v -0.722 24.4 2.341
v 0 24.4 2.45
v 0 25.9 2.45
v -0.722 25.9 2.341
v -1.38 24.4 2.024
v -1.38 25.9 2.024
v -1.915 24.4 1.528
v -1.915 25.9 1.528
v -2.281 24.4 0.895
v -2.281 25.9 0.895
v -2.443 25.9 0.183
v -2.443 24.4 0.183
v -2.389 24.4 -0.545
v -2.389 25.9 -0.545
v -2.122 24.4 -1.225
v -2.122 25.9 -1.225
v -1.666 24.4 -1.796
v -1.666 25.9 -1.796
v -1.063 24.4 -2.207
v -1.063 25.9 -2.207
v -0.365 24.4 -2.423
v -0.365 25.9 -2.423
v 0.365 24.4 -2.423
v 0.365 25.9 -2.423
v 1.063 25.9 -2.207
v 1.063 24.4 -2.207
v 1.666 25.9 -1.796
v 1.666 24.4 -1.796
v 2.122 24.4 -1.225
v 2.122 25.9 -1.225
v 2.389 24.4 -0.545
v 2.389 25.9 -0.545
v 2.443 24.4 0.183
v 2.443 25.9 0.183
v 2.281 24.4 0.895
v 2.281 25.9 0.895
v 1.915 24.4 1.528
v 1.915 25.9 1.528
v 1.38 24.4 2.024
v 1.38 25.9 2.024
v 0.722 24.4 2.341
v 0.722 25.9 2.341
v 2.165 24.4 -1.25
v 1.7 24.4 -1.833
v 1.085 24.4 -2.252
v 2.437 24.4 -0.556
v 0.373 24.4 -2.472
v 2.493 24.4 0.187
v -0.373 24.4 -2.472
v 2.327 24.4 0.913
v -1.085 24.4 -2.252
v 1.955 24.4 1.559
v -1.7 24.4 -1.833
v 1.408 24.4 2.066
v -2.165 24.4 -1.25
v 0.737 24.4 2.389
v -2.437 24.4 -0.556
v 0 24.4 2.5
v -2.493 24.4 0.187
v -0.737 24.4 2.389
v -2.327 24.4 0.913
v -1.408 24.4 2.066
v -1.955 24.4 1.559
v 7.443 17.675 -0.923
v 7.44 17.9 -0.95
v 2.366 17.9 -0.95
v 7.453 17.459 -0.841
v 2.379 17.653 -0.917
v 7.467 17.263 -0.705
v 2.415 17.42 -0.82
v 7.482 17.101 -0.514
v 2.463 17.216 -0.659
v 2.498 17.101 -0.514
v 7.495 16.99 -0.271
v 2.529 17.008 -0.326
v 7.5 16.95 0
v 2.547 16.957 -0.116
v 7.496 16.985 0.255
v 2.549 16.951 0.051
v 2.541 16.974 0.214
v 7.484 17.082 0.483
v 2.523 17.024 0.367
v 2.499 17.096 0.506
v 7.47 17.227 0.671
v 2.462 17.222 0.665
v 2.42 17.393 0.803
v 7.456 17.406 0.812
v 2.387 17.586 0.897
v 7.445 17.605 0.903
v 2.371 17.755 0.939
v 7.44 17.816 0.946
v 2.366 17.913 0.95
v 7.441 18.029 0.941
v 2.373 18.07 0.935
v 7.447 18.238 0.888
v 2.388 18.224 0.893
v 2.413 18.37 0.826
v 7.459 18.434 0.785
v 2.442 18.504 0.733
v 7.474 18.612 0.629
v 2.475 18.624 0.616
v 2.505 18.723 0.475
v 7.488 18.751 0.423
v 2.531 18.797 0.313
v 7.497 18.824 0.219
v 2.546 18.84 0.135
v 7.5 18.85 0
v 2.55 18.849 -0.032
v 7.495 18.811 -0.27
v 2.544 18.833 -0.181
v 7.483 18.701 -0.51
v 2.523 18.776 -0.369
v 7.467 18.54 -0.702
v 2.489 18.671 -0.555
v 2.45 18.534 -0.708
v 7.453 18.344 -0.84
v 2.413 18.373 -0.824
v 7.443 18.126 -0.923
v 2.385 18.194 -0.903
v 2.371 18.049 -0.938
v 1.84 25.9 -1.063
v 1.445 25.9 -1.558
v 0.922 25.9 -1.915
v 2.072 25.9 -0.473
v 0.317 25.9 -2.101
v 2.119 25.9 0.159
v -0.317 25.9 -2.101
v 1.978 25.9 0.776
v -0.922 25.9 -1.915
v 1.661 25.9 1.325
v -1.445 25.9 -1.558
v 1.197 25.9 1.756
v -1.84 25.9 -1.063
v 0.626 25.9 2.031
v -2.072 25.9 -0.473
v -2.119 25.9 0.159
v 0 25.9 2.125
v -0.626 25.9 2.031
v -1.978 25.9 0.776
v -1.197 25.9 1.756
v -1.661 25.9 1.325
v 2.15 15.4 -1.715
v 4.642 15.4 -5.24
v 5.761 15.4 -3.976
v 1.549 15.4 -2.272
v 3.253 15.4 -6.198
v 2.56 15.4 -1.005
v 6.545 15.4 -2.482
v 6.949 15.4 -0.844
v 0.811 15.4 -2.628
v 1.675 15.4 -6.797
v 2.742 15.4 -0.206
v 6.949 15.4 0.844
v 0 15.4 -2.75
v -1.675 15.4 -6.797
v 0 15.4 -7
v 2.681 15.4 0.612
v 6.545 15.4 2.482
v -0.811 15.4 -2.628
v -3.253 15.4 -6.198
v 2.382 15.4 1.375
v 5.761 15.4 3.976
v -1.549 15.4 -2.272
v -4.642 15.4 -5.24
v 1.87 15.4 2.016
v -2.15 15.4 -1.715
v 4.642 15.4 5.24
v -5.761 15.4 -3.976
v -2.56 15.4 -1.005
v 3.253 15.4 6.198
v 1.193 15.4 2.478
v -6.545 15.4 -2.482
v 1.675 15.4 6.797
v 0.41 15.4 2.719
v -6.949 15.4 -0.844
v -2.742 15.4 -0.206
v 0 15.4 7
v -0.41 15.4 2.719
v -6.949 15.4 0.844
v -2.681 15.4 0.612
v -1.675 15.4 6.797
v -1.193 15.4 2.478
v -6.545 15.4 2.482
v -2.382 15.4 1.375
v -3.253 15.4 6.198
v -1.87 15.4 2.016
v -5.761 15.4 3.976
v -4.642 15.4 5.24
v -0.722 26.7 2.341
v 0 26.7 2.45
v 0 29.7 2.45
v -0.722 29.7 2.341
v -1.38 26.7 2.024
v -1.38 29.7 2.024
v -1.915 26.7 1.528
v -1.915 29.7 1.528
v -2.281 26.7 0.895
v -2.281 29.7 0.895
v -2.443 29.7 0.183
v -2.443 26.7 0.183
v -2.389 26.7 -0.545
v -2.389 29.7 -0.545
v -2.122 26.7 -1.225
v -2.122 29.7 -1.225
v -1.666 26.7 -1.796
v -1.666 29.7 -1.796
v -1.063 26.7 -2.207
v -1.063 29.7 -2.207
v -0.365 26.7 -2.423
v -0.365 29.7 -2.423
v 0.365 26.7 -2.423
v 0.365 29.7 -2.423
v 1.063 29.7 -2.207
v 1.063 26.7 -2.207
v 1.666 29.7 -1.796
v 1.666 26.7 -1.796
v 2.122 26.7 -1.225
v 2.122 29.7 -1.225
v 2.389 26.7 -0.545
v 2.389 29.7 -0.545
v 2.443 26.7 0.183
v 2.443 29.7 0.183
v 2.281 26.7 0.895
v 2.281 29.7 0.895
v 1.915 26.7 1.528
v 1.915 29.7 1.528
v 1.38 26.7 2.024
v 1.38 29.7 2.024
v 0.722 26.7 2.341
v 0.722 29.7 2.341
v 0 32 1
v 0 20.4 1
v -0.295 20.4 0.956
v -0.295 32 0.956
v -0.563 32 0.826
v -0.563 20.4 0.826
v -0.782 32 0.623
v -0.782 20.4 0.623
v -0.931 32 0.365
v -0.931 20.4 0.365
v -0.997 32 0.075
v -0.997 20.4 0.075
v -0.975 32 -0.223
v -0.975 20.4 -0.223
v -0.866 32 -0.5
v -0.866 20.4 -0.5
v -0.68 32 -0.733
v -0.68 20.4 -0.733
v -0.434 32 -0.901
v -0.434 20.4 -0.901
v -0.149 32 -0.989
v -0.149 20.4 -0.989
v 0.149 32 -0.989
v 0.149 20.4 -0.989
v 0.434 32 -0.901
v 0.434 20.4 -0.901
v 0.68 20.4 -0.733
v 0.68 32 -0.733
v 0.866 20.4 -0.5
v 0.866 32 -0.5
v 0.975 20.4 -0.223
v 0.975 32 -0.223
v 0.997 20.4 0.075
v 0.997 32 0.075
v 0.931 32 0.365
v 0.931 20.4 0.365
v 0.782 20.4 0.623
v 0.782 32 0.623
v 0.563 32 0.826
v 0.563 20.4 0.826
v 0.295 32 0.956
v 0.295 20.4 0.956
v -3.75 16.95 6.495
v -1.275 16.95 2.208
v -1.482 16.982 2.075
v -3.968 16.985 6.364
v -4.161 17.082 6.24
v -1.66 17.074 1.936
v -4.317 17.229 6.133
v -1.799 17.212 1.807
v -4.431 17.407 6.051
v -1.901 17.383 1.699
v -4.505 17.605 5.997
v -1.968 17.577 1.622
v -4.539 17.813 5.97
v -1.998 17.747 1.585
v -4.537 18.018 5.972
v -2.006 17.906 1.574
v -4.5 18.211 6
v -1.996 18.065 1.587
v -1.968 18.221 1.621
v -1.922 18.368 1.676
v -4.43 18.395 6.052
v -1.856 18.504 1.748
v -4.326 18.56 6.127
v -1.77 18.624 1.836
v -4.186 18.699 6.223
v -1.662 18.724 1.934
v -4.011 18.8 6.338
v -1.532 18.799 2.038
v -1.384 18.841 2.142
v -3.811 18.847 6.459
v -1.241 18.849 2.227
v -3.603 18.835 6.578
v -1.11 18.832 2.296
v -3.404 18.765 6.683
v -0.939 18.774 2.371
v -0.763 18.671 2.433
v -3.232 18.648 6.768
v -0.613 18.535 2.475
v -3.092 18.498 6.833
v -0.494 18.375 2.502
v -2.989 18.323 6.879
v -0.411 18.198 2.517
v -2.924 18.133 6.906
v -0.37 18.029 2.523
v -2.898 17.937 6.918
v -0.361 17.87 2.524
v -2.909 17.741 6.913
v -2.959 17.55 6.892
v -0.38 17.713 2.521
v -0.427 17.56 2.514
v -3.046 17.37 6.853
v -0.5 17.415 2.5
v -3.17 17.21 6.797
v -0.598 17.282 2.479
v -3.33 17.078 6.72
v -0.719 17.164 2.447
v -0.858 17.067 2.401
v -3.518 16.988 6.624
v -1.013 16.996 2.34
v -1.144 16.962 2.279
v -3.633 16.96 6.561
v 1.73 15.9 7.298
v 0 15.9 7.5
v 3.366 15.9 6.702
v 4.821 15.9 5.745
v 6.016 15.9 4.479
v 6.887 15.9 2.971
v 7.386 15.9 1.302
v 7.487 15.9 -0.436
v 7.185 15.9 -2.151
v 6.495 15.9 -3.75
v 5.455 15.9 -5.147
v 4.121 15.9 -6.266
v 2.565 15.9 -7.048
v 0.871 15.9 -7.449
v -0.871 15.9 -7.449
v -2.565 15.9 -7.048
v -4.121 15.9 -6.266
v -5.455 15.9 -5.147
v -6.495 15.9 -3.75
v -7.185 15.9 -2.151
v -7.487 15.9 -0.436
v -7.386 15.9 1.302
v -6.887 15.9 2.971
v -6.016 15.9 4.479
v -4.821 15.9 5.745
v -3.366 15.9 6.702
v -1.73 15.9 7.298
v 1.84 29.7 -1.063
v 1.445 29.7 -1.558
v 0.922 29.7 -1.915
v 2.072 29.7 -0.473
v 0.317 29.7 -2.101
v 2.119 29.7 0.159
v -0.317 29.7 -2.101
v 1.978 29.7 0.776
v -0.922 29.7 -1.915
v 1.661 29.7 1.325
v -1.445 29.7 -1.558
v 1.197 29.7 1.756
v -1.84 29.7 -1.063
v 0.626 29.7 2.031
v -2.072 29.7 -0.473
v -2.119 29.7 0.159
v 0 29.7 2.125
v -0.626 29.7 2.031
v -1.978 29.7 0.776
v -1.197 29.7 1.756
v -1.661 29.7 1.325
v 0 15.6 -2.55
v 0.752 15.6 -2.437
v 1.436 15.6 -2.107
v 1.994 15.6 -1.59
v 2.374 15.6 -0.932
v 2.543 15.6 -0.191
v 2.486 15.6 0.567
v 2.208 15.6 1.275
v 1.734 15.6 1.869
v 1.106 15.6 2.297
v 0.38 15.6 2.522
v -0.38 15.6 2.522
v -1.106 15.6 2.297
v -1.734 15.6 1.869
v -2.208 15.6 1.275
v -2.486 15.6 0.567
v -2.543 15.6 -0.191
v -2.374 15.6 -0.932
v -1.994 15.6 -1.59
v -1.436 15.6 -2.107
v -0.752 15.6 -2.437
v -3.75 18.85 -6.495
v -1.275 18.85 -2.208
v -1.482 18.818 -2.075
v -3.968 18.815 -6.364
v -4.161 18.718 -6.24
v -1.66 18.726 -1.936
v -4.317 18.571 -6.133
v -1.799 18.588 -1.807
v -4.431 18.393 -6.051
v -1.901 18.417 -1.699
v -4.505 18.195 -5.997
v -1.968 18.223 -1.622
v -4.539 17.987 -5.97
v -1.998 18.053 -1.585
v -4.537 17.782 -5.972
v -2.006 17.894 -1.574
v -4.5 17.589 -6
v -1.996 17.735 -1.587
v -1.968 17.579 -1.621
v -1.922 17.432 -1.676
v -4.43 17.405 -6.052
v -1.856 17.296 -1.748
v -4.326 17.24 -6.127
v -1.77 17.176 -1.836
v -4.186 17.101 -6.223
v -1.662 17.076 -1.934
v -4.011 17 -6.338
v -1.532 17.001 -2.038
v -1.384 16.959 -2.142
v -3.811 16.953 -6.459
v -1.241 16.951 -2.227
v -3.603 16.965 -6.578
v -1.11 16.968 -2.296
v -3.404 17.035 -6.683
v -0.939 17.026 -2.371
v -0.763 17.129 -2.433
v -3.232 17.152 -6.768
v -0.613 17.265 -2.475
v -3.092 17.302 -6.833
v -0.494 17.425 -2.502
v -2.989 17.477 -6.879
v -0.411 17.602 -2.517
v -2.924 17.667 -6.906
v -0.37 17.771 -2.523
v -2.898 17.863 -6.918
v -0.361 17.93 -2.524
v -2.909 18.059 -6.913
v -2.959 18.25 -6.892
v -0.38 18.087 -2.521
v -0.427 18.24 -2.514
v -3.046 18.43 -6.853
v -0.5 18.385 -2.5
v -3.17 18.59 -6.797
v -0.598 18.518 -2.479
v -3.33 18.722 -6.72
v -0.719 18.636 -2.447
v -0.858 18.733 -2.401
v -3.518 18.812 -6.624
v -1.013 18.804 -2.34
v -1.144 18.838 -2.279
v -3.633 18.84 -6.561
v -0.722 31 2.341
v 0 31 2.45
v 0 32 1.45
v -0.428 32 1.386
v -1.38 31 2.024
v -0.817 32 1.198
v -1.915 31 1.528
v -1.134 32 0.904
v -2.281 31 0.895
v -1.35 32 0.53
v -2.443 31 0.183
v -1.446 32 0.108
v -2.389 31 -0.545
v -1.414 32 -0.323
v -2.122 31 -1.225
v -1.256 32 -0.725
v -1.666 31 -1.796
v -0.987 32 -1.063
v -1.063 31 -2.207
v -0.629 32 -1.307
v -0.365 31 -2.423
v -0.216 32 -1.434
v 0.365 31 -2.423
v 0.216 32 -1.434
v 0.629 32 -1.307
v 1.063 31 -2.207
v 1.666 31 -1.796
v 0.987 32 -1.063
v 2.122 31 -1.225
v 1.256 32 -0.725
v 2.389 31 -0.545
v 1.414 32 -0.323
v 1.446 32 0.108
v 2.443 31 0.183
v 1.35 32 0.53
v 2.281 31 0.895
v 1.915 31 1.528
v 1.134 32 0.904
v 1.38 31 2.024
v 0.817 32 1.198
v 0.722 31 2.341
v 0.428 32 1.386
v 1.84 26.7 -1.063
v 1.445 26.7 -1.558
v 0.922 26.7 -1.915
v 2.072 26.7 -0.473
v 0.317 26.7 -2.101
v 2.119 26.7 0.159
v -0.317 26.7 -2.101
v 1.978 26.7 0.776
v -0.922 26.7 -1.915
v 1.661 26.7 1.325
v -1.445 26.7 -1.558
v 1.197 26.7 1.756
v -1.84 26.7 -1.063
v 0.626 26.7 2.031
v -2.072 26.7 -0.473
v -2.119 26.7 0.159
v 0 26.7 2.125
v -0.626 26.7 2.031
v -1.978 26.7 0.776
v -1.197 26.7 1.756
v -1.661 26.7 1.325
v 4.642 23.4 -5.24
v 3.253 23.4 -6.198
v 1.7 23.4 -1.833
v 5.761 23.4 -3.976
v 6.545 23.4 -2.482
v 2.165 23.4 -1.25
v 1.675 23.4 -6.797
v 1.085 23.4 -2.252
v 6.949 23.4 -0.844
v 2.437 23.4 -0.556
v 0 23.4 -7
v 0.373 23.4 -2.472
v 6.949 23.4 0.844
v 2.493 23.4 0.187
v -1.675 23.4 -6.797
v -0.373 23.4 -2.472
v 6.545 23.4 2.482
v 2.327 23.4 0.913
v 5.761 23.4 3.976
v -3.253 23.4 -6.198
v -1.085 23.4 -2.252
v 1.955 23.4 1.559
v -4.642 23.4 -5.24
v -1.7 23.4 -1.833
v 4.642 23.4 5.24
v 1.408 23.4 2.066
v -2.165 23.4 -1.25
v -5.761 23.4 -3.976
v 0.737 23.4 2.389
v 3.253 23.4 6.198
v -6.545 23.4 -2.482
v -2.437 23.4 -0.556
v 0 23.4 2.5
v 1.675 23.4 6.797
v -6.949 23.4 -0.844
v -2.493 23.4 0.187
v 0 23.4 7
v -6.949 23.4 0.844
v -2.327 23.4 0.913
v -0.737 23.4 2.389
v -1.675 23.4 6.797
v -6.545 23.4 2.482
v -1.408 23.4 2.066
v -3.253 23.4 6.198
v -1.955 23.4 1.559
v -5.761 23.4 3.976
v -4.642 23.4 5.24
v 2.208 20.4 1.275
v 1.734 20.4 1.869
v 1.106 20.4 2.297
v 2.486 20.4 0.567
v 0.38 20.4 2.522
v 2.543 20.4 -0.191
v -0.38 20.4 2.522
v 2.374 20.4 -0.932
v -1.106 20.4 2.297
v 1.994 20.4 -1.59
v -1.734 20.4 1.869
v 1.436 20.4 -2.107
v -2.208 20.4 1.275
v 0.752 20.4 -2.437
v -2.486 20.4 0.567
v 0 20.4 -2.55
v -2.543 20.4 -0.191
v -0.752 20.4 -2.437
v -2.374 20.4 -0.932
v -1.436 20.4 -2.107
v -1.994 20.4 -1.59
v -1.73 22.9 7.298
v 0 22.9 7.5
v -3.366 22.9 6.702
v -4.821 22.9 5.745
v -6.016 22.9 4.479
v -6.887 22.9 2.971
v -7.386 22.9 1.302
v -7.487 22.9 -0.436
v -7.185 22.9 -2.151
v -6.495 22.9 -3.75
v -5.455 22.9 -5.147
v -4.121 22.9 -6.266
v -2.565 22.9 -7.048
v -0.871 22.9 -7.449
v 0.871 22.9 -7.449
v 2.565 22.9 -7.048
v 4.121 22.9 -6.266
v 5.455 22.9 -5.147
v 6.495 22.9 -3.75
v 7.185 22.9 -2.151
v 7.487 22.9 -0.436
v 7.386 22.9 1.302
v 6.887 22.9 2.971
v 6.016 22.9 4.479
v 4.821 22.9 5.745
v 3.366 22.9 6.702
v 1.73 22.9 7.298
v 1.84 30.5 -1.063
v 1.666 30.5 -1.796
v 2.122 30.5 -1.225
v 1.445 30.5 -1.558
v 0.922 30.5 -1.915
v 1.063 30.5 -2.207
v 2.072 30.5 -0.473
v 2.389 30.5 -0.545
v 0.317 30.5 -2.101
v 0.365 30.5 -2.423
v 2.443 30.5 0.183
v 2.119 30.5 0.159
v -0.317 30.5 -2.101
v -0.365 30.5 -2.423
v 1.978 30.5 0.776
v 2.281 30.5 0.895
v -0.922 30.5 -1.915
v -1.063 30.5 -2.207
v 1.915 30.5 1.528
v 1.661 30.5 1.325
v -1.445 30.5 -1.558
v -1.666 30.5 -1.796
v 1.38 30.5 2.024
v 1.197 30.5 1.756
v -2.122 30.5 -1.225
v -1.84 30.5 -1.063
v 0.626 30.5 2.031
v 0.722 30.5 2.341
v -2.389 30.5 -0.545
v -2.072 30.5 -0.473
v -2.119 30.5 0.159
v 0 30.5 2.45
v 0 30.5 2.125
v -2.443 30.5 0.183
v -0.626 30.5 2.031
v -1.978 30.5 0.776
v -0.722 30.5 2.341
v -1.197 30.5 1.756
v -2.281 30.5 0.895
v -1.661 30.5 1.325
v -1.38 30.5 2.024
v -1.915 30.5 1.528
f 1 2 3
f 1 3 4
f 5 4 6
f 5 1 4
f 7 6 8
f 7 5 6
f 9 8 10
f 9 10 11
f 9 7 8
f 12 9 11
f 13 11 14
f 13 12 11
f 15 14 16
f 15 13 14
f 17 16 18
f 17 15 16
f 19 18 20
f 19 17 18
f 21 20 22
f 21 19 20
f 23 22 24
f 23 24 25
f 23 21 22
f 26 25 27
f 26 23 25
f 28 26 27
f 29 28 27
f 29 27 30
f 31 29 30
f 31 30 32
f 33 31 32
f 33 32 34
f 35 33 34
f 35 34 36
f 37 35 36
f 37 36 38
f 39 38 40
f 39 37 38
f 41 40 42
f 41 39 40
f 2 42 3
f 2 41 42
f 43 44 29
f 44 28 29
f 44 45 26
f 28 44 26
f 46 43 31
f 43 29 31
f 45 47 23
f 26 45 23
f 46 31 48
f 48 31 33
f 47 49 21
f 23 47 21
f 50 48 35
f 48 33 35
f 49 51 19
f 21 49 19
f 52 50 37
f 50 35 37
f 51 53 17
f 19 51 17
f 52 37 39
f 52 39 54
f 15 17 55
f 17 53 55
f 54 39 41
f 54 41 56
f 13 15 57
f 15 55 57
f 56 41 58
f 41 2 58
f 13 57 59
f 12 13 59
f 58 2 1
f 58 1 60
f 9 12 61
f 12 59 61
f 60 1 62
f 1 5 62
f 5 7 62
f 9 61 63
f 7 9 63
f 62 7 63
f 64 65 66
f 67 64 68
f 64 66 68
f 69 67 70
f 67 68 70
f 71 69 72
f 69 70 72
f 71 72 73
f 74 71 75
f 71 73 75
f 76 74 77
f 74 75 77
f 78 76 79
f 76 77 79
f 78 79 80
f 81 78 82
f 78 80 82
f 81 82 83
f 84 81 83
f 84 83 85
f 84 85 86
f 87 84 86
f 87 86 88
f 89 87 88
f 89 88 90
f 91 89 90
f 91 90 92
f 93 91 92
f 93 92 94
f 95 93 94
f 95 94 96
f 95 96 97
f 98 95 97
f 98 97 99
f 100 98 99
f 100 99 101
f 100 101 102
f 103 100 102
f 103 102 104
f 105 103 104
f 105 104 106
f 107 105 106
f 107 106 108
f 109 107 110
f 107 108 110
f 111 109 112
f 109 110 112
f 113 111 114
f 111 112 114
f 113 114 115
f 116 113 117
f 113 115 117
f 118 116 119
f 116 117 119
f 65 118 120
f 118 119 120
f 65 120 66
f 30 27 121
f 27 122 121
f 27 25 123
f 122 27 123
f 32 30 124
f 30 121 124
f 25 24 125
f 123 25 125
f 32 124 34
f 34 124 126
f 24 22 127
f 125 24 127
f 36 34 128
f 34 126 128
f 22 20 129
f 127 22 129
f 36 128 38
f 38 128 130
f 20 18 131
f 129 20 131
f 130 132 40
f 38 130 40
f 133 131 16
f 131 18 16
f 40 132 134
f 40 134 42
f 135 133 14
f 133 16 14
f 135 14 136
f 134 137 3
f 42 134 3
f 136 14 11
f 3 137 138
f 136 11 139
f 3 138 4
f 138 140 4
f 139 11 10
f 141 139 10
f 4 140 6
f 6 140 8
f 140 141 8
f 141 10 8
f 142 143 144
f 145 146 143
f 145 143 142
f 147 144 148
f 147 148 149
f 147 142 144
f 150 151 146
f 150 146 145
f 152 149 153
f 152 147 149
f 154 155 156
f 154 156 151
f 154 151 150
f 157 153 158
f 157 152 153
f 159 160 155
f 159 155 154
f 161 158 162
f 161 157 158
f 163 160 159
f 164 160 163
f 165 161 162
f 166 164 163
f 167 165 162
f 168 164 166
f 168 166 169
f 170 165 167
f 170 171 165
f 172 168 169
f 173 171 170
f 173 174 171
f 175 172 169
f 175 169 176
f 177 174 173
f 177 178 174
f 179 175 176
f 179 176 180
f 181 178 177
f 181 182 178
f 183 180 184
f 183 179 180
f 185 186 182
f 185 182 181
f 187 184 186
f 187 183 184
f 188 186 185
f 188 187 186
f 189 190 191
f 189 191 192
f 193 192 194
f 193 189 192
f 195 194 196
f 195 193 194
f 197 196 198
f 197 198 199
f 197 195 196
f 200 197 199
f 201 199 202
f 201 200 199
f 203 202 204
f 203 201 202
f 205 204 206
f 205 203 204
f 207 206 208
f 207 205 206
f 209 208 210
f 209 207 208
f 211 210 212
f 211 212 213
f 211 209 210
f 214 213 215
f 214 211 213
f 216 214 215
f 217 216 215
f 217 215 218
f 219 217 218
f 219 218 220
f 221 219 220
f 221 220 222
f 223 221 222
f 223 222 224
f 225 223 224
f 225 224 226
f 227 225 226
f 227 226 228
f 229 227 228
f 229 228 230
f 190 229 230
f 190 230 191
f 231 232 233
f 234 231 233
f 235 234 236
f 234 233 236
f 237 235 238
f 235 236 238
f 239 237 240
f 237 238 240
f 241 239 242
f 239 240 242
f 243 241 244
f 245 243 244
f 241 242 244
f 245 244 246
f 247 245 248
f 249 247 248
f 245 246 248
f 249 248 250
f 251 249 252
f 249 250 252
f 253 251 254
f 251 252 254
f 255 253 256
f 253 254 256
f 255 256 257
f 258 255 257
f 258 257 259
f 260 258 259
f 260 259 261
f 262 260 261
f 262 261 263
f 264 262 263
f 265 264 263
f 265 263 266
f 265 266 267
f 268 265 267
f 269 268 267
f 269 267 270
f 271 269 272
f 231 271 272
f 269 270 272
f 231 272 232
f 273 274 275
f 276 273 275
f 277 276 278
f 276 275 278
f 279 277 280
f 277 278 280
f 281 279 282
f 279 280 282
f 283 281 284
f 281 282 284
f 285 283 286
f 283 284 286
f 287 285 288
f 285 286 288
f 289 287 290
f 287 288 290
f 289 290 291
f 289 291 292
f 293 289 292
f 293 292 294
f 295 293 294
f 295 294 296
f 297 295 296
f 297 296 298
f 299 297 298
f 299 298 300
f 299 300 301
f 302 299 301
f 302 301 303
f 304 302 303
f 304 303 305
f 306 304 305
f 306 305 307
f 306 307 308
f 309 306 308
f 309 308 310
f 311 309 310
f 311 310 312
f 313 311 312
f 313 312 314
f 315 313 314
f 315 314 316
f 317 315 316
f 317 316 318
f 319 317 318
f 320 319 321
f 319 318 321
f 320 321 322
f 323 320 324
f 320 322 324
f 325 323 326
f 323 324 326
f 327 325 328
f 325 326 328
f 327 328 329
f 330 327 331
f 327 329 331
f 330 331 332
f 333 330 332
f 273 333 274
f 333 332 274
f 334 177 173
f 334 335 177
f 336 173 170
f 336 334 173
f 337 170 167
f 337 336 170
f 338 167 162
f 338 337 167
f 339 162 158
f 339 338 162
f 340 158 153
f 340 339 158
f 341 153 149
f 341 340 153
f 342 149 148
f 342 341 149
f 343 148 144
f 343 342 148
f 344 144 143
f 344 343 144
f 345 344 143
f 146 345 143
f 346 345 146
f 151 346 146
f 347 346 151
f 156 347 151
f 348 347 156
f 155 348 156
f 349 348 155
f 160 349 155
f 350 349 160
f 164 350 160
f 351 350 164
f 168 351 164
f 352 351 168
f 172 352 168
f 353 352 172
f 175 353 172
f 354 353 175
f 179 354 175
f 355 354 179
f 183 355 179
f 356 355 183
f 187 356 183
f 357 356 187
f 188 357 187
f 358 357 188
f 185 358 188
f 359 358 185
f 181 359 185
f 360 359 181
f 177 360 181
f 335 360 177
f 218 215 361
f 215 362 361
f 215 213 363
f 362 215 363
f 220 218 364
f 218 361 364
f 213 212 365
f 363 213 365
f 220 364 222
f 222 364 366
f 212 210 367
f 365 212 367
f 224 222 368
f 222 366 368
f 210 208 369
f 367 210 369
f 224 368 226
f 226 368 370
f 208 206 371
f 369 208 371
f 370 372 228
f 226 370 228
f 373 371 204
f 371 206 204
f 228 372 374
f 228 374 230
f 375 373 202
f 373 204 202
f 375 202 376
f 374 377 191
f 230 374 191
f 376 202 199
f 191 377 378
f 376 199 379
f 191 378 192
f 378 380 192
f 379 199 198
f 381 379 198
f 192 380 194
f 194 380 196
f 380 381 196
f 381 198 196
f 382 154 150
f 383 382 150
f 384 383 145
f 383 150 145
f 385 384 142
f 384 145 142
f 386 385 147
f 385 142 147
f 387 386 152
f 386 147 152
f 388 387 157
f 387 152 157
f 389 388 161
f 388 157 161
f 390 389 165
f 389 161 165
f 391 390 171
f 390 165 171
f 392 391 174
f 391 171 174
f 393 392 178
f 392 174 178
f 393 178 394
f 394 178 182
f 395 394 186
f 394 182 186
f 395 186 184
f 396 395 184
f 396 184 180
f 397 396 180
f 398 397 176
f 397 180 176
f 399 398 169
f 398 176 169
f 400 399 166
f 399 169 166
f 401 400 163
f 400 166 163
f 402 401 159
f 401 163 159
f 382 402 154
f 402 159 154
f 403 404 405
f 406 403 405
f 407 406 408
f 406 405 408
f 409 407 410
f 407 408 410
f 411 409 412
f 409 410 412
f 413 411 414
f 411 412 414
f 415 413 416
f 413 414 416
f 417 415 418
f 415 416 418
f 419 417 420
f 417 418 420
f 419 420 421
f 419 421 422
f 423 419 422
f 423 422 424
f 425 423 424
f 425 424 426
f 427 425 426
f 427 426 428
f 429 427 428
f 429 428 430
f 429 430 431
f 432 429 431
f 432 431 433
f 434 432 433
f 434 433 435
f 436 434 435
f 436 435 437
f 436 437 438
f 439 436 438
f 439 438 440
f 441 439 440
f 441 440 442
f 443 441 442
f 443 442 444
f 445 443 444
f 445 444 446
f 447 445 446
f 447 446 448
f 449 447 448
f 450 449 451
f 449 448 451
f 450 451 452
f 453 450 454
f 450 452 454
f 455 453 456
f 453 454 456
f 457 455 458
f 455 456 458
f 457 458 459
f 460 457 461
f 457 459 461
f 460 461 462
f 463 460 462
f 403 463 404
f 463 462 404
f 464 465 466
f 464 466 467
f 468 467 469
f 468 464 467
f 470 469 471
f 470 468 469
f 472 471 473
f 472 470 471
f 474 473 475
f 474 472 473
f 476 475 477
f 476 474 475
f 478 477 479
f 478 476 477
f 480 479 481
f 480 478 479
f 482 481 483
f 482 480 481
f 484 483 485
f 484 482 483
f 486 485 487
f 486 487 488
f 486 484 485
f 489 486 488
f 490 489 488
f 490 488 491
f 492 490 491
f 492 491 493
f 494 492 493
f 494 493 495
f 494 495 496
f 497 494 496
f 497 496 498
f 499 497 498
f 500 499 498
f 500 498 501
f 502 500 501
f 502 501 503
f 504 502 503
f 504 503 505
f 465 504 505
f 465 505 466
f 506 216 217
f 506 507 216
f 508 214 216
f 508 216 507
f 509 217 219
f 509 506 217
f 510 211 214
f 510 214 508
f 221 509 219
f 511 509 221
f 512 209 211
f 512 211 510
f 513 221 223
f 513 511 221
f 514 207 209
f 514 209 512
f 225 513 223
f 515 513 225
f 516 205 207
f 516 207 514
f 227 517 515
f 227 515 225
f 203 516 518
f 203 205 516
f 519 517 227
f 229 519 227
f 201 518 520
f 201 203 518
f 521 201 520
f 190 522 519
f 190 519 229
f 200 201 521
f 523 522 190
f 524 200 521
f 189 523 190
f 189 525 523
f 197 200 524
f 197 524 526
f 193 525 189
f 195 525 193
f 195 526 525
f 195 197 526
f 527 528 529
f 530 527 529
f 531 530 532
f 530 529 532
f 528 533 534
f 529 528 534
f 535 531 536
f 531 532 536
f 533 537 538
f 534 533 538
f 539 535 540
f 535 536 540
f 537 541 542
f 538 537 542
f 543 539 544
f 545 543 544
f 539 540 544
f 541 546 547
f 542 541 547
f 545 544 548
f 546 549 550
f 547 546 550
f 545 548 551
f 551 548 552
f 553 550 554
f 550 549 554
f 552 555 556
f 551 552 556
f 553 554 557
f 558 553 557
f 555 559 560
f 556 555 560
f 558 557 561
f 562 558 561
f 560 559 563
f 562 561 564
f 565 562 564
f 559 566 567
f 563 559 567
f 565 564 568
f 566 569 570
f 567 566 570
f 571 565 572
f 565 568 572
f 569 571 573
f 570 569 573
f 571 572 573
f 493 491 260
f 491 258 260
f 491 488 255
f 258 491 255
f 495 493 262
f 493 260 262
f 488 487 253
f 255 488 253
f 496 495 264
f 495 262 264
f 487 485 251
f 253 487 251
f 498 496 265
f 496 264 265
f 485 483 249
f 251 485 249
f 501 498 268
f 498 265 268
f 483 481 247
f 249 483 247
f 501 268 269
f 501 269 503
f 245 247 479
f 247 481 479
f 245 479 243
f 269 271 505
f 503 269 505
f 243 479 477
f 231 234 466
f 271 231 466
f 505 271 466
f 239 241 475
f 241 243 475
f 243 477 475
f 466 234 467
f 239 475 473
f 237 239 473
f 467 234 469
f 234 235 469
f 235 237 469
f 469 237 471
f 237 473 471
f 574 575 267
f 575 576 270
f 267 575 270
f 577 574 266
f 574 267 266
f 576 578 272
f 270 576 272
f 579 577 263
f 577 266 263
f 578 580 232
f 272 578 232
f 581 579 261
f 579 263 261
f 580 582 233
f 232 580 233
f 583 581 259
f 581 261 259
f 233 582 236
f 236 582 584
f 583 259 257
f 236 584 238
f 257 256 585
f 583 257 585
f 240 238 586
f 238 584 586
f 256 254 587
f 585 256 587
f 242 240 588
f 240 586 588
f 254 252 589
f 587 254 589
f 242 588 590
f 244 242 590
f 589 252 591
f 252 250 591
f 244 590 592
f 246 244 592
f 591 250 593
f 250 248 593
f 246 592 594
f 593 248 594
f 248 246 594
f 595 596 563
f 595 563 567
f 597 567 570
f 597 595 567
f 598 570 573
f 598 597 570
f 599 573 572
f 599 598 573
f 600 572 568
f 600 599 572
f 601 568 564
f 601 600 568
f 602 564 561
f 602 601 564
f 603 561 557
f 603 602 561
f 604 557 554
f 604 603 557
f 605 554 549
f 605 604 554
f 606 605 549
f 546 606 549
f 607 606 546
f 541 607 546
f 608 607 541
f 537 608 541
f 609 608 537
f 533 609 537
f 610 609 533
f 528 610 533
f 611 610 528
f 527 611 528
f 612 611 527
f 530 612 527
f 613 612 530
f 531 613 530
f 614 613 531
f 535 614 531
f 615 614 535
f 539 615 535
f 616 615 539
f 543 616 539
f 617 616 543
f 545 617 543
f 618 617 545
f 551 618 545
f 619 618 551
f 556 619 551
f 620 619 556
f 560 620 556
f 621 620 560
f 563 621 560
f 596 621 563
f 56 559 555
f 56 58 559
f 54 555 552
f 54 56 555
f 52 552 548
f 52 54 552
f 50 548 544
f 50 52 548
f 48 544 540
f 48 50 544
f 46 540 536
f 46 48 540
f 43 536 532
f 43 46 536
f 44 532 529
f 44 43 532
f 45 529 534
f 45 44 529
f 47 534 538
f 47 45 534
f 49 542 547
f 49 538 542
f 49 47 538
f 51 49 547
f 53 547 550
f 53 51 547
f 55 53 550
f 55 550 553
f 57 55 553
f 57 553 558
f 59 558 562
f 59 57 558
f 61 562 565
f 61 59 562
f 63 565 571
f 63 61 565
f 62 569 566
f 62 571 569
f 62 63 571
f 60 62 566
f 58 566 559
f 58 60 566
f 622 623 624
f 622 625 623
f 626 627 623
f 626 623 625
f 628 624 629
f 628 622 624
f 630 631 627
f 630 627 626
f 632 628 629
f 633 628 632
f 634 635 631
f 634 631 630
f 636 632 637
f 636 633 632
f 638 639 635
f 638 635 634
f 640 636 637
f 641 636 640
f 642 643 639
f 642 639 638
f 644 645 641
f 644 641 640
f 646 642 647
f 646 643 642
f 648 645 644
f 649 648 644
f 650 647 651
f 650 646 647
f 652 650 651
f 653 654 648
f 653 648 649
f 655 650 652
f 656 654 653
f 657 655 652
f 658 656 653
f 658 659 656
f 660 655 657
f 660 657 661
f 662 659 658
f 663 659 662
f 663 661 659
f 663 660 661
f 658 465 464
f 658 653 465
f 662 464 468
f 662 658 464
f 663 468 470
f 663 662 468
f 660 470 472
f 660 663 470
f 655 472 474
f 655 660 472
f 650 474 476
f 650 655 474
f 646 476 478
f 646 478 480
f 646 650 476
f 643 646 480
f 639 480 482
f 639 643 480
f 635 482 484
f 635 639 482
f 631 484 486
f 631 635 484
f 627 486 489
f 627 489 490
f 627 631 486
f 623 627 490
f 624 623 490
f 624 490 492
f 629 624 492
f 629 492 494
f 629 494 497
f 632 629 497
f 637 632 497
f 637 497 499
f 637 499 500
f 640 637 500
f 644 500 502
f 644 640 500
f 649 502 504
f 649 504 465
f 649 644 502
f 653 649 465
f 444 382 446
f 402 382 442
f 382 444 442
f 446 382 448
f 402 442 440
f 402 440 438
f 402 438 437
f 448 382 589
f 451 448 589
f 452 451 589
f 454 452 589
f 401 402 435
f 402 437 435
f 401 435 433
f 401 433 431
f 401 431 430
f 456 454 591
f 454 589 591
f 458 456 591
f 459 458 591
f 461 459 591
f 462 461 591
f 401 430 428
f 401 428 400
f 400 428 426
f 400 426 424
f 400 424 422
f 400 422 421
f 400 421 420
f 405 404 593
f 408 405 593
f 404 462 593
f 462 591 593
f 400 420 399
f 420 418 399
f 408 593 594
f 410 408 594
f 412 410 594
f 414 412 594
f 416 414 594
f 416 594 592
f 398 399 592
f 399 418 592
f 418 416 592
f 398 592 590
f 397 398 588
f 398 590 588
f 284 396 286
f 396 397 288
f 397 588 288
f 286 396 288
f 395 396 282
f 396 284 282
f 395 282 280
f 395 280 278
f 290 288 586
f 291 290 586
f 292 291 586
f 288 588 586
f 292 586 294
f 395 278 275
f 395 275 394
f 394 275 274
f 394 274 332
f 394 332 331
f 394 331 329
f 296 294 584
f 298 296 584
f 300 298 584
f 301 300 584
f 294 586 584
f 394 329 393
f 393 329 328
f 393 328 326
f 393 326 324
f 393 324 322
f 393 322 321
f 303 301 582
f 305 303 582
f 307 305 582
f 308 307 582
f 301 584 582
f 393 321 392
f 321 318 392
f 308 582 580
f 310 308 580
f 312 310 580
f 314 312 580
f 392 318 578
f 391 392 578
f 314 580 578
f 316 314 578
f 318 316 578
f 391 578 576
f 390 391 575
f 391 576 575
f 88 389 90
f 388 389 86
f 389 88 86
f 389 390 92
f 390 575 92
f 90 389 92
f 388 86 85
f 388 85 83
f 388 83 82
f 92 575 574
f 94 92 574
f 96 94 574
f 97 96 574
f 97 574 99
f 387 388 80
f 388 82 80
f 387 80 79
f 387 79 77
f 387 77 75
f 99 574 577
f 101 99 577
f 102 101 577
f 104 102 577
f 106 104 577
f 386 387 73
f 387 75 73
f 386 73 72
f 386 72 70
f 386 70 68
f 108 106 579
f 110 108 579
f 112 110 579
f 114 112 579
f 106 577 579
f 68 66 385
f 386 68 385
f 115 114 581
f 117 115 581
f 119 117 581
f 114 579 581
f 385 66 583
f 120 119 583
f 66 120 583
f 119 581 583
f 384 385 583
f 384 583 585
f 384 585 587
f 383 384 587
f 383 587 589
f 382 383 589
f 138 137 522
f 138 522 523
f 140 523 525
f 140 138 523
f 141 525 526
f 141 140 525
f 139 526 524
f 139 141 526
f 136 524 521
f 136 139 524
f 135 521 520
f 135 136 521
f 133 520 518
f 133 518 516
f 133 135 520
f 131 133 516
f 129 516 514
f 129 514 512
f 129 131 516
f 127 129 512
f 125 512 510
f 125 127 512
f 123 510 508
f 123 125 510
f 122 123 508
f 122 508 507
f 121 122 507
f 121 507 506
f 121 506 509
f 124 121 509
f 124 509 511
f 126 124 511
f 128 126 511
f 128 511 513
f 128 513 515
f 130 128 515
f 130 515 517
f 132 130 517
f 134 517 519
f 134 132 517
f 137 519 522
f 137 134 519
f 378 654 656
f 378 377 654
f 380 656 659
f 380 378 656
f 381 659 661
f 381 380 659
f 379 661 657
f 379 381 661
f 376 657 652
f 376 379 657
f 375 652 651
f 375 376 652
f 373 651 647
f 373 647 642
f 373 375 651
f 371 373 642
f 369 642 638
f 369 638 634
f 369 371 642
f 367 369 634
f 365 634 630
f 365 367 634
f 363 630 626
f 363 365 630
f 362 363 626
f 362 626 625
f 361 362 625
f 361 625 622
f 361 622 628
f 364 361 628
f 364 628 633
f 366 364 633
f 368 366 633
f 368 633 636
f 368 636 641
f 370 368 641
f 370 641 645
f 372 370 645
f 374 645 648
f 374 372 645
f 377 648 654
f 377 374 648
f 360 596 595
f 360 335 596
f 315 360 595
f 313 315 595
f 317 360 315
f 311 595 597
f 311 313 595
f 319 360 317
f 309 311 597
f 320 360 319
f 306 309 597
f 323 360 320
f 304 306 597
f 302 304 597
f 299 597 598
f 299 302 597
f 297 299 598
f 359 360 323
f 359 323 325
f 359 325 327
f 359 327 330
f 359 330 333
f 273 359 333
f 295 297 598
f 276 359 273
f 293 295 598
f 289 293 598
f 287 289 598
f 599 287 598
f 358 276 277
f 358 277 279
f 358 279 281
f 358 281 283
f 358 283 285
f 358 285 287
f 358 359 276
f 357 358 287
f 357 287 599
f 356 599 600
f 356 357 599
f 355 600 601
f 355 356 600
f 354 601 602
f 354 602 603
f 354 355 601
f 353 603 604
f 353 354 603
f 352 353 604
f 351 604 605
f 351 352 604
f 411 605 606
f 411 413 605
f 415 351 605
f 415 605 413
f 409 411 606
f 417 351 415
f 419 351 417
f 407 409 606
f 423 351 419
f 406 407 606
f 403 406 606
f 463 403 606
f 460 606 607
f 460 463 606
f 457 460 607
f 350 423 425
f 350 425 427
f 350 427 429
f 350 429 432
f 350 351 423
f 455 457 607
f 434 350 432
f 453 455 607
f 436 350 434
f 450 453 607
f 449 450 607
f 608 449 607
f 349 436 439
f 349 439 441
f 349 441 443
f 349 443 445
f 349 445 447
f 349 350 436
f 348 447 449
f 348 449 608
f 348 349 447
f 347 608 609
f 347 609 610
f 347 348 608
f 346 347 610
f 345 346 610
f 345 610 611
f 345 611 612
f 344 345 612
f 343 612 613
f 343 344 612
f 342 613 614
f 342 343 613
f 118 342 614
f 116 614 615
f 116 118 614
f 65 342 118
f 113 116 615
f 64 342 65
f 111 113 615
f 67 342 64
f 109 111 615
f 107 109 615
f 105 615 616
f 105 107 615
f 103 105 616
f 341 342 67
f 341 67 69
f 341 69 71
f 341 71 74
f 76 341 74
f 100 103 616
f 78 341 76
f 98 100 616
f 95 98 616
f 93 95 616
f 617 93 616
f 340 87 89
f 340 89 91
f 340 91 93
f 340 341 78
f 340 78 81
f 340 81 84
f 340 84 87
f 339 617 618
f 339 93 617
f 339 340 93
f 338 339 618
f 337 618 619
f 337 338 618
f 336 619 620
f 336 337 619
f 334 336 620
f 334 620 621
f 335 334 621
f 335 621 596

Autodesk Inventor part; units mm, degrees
sketch "Sketch1" plane through (0, 0, 0) normal (1, 0, 0) x (0, 1, 0)
  line L0 (32, 0) -> (32, 2.45)
  line L1 (32, 2.45) -> (30.5, 2.45)
  line L2 (30.5, 2.45) -> (30.5, 2.125)
  line L3 (30.5, 2.125) -> (29.7, 2.125)
  line L4 (29.7, 2.125) -> (29.7, 2.45)
  line L5 (29.7, 2.45) -> (26.7, 2.45)
  line L6 (26.7, 2.45) -> (26.7, 2.125)
  line L7 (26.7, 2.125) -> (25.9, 2.125)
  line L8 (25.9, 2.125) -> (25.9, 2.45)
  line L9 (25.9, 2.45) -> (24.4, 2.45)
  line L10 (23.4, 2.5) -> (24.4, 2.5)
  line L11 (24.4, 2.5) -> (24.4, 2.45)
  line L12 (23.4, 2.5) -> (23.4, 7.5)
  line L13 (32, 2.45) -> (31, 2.45)
  line L14 (32, 2.45) -> (32, 1.45)
  line L15 (23.4, 7.5) -> (15.4, 7.5)
  line L16 (15.4, 7.5) -> (15.4, 0)
  line L17 (32, 0) -> (15.4, 0)
  point P0 (0, 0)
  dimension "d345" = 1.5
  dimension "d346" = 0.325
  dimension "d347" = 0.8
  dimension "d348" = 3
  dimension "d349" = 0.325
  dimension "d350" = 0.8
  dimension "d353" = 1
  dimension "d354" = 1
  dimension "d355" = 1
  dimension "d401" = 8
  dimension "d402" = 16.6
revolve "Revolution1" add sketch "Sketch1" angle 360 about axis through (0, 32, 0) along (0, -1, 0)
chamfer "Chamfer8" distance 1 angle 45 1 edges at (0, 32, -2.45)
sketch "Sketch13" plane through (0, 32, 0) normal (0, 1, 0) x (1, 0, 0)
  circle A0 centre (0, 0) radius 1
  point P0 (0, 0)
  dimension "d359" = 2
hole "Hole10" at (0, 32, 0) direction (0, -1, 0) diameter 2 end through all
ref_plane "Work Plane8" through (0, 26.3, 0) normal (0, 1, 0) x (1, 0, 0)
ref_plane "Work Plane9" through (0, 30.1, 0) normal (0, 1, 0) x (1, 0, 0)
sketch "Sketch16" plane through (0, 15.4, 0) normal (0, -1, 0) x (1, 0, 0)
  circle A0 centre (0, 0) radius 2.55
  dimension "d404" = 5.1
hole "Hole12" at (0, 15.4, 0) direction (0, 1, 0) diameter 5.1 depth 5
sketch "Sketch19" plane through (0, 15.4, 0) normal (0, -1, 0) x (1, 0, 0)
  circle A0 centre (0, 0) radius 7.5 projected
  line L0 (0, 0) -> (7.5, 0)
  line L1 (0, 0) -> (-3.75, -6.4952)
  line L2 (0, 0) -> (7.5, 0) construction
  line L3 (0, 0) -> (-3.75, 6.4952)
  line L4 (0, 0) -> (7.5, 0) construction
  point P0 (0, 0)
  dimension "d423" = 7.5
  dimension "d424" = 120
  dimension "d425" = 7.5
  dimension "d426" = 120
ref_plane "Work Plane12" through (7.5, 15.4, 0) normal (1, 0, 0) x (0, 1, 0)
ref_plane "Work Plane13" through (-3.75, 15.4, 6.4952) normal (-0.5, 0, 0.866) x (0, -1, 0)
ref_plane "Work Plane14" through (-3.75, 15.4, -6.4952) normal (-0.5, 0, -0.866) x (0, -1, 0)
sketch "Sketch20" plane through (-3.75, 15.4, -6.4952) normal (-0.5, 0, -0.866) x (0, -1, 0)
  line L0 (0, -7.5) -> (0, 7.5) projected
  line L1 (0, 0) -> (-2.5, 0)
  point P0 (15.4, 0)
  dimension "d427" = 2.5
sketch "Sketch21" plane through (-3.75, 15.4, 6.4952) normal (-0.5, 0, 0.866) x (0, -1, 0)
  line L0 (0, -7.5) -> (0, 7.5) projected
  line L1 (0, 0) -> (-2.5, 0)
  point P0 (15.4, 0)
  dimension "d428" = 2.5
sketch "Sketch22" plane through (7.5, 15.4, 0) normal (1, 0, 0) x (0, 1, 0)
  line L0 (0, 0) -> (2.5, 0)
  point P0 (-15.4, 0)
  dimension "d429" = 2.5
hole "Hole14" at (-3.75, 17.9, 6.4952) direction (0.5, 0, -0.866) diameter 1.9 depth 6
hole "Hole15" at (-3.75, 17.9, -6.4952) direction (0.5, 0, 0.866) diameter 1.9 depth 6
hole "Hole16" at (7.5, 17.9, 0) direction (-1, 0, 0) diameter 1.9 depth 6
thread "Thread25" size "M2x0.4" class "6H" standard "ANSI Metric M Profile" full length
thread "Thread26" size "M2x0.4" class "6H" standard "ANSI Metric M Profile" full length
thread "Thread27" size "M2x0.4" class "6H" standard "ANSI Metric M Profile" full length
chamfer "Chamfer9" distance 0.5 angle 45 2 edges at (0, 23.4, -7.5) (0, 15.4, -7.5)
chamfer "Chamfer10" distance 0.2 angle 45 1 edges at (0, 15.4, 2.55)
ref_plane "Work Plane15" through (-1.25, 15.4, 2.1651) normal (-0.5, 0, 0.866) x (0, -1, 0)
ref_plane "Work Plane16" through (2.5, 15.4, 0) normal (1, 0, 0) x (0, 1, 0)
ref_plane "Work Plane17" through (-1.25, 15.4, -2.1651) normal (-0.5, 0, -0.866) x (0, -1, 0)
properties part number "None_Magnet_Extender_Split_Top" material "Aluminum 6061"
